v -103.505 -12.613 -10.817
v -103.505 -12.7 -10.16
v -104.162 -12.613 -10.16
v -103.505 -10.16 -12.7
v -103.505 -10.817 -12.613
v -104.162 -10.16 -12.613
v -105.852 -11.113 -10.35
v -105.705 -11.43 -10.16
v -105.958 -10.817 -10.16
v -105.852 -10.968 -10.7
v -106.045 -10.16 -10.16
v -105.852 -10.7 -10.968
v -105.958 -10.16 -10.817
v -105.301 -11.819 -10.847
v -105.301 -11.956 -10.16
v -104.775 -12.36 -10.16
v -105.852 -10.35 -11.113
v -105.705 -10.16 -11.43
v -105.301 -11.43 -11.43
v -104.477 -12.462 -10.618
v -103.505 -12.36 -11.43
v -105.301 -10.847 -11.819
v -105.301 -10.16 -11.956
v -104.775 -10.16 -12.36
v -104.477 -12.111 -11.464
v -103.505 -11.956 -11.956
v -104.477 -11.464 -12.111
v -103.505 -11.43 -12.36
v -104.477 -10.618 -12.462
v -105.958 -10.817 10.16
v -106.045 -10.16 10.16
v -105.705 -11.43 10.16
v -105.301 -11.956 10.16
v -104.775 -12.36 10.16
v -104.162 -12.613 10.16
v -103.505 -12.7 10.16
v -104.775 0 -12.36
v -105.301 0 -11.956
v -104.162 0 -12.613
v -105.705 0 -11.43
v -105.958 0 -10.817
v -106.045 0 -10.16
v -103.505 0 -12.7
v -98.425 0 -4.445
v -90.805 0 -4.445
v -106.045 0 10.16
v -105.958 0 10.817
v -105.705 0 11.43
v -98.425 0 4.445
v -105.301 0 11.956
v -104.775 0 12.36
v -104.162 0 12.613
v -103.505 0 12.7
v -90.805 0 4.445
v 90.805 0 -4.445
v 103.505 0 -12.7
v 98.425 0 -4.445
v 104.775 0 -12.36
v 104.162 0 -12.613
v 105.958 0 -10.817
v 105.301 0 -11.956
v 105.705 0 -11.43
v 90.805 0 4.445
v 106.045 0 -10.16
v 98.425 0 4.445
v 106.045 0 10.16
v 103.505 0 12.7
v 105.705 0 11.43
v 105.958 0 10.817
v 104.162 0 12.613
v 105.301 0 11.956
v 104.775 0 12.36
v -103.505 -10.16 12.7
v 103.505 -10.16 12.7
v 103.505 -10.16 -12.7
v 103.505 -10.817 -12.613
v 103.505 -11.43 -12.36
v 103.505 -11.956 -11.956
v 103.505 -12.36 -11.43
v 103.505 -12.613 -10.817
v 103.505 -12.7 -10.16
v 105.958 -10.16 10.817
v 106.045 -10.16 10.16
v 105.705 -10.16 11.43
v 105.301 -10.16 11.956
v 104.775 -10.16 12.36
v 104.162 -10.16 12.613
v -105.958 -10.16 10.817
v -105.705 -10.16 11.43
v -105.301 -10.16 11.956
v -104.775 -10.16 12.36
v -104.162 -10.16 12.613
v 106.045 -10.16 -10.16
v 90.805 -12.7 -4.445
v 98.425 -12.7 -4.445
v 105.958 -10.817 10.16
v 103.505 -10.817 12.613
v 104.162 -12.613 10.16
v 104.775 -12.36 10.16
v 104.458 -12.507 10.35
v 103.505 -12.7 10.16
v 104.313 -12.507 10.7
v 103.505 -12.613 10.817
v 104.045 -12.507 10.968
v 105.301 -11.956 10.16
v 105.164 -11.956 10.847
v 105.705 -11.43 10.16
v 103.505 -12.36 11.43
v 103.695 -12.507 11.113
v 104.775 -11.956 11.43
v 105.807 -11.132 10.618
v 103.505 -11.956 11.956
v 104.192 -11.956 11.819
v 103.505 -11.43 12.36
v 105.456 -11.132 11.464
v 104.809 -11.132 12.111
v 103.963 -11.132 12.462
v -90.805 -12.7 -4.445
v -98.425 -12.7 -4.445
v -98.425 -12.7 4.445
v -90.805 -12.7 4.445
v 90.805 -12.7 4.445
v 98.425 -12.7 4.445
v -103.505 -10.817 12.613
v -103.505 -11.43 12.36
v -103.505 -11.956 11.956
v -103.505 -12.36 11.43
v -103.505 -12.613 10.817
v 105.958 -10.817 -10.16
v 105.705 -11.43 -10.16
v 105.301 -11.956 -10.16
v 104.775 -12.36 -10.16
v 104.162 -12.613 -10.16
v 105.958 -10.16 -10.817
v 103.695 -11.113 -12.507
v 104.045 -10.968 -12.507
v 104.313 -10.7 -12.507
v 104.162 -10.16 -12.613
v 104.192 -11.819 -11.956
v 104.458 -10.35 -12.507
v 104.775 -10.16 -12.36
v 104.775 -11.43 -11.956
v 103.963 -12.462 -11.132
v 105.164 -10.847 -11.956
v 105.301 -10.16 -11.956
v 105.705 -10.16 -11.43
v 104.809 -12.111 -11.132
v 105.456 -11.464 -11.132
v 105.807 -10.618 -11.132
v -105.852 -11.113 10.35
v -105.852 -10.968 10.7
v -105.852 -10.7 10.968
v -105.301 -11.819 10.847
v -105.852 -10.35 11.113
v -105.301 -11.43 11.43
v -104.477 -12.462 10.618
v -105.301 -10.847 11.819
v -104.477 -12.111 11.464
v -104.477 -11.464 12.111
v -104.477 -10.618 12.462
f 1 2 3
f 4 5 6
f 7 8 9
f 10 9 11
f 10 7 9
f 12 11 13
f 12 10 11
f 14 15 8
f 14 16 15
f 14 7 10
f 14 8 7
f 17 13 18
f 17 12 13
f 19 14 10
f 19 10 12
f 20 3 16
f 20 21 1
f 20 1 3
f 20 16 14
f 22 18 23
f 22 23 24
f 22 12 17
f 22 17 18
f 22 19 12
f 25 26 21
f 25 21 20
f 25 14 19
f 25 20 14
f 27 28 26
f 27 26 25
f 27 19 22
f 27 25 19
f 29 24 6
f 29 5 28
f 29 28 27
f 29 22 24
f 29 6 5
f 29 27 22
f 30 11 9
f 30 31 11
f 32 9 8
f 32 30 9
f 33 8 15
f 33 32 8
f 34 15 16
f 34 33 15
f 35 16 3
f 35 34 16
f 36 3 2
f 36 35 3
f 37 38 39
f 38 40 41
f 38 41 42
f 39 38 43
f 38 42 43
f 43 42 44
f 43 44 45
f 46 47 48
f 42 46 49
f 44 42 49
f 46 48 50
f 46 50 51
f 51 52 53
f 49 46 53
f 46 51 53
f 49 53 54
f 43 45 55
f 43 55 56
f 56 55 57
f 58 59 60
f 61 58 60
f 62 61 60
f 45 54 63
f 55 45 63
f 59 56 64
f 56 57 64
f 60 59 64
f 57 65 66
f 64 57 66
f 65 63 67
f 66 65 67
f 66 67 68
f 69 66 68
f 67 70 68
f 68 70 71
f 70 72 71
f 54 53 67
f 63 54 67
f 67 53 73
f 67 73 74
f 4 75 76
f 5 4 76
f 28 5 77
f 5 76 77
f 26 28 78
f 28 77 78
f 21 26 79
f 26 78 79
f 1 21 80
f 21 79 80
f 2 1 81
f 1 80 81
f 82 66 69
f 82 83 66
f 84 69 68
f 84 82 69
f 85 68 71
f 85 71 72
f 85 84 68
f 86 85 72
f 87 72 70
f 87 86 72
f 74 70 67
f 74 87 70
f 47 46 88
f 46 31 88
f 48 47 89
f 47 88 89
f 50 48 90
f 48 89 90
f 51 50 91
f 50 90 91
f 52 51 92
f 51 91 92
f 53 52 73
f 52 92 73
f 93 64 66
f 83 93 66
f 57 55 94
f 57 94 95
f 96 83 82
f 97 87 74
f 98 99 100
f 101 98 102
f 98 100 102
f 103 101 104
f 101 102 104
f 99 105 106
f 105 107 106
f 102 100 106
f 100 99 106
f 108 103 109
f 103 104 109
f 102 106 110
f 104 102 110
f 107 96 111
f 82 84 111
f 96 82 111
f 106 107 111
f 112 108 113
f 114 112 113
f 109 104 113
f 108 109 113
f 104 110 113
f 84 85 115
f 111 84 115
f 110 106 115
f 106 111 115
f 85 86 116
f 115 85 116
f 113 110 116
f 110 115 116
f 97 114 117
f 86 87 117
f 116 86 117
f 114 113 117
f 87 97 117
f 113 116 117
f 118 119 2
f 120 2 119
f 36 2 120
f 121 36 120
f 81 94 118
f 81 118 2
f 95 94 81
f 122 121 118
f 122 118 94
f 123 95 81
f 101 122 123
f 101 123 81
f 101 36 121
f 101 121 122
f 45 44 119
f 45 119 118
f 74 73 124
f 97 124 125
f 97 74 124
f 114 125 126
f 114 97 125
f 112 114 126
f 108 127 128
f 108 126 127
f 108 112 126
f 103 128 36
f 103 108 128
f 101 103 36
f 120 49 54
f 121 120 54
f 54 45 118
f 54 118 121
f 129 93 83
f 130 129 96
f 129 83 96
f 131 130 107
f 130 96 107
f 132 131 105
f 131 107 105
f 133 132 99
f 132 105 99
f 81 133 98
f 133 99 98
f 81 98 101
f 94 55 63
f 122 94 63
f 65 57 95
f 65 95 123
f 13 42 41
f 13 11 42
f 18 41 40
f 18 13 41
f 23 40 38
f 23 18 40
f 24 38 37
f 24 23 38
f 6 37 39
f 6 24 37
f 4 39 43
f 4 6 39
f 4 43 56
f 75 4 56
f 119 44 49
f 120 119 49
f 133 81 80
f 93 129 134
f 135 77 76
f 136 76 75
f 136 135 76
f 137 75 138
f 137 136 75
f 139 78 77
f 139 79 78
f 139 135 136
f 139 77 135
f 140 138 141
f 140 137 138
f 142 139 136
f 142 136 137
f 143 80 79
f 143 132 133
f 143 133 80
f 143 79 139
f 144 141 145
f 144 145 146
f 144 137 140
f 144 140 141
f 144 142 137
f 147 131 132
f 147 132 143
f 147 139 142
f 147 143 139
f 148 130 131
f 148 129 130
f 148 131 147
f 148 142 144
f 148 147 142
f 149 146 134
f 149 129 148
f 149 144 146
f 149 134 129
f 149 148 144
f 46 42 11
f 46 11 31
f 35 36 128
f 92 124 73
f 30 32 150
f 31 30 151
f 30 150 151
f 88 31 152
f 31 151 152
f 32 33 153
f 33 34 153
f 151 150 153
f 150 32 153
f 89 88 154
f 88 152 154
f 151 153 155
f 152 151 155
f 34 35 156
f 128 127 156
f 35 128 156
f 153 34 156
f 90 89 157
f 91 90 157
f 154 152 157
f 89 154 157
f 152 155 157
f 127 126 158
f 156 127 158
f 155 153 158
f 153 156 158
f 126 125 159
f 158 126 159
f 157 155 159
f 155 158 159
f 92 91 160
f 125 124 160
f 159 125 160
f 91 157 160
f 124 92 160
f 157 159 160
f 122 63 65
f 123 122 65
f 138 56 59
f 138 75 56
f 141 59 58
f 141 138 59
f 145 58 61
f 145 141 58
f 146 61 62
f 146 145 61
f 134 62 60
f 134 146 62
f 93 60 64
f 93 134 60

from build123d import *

# Parameters (mm, degrees)
F0_W     = 212.09
F0_H     = 25.4
F1_DEPTH = 12.7
F2_R     = 2.54
F4_W     = 7.62
F4_H     = 8.89
F5_DEPTH = 25.4


with BuildPart() as f1:
    # F0 (on Front) → F1 (new body)
    with BuildSketch(Plane.XZ):
        Rectangle(F0_W, F0_H)
    extrude(amount=F1_DEPTH)

    # F2
    f2_edges = [f1.edges().sort_by_distance(p)[0] for p in [
        (106.045, -6.35, 12.7),
        (106.045, -12.7, 0),
        (0, -12.7, 12.7),
        (0, -12.7, -12.7),
        (-106.045, -12.7, 0),
        (-106.045, -6.35, 12.7),
        (106.045, -6.35, -12.7),
        (-106.045, -6.35, -12.7),
    ]]
    fillet(f2_edges, radius=F2_R)

    # F4 (on Front) → F5 (cut)
    with BuildSketch(Plane.XZ):
        with Locations((94.615, 0)):
            Rectangle(F4_W, F4_H)
        with Locations((-94.615, 0)):
            Rectangle(F4_W, F4_H)
    extrude(amount=F5_DEPTH, mode=Mode.SUBTRACT)


solid = f1.part
